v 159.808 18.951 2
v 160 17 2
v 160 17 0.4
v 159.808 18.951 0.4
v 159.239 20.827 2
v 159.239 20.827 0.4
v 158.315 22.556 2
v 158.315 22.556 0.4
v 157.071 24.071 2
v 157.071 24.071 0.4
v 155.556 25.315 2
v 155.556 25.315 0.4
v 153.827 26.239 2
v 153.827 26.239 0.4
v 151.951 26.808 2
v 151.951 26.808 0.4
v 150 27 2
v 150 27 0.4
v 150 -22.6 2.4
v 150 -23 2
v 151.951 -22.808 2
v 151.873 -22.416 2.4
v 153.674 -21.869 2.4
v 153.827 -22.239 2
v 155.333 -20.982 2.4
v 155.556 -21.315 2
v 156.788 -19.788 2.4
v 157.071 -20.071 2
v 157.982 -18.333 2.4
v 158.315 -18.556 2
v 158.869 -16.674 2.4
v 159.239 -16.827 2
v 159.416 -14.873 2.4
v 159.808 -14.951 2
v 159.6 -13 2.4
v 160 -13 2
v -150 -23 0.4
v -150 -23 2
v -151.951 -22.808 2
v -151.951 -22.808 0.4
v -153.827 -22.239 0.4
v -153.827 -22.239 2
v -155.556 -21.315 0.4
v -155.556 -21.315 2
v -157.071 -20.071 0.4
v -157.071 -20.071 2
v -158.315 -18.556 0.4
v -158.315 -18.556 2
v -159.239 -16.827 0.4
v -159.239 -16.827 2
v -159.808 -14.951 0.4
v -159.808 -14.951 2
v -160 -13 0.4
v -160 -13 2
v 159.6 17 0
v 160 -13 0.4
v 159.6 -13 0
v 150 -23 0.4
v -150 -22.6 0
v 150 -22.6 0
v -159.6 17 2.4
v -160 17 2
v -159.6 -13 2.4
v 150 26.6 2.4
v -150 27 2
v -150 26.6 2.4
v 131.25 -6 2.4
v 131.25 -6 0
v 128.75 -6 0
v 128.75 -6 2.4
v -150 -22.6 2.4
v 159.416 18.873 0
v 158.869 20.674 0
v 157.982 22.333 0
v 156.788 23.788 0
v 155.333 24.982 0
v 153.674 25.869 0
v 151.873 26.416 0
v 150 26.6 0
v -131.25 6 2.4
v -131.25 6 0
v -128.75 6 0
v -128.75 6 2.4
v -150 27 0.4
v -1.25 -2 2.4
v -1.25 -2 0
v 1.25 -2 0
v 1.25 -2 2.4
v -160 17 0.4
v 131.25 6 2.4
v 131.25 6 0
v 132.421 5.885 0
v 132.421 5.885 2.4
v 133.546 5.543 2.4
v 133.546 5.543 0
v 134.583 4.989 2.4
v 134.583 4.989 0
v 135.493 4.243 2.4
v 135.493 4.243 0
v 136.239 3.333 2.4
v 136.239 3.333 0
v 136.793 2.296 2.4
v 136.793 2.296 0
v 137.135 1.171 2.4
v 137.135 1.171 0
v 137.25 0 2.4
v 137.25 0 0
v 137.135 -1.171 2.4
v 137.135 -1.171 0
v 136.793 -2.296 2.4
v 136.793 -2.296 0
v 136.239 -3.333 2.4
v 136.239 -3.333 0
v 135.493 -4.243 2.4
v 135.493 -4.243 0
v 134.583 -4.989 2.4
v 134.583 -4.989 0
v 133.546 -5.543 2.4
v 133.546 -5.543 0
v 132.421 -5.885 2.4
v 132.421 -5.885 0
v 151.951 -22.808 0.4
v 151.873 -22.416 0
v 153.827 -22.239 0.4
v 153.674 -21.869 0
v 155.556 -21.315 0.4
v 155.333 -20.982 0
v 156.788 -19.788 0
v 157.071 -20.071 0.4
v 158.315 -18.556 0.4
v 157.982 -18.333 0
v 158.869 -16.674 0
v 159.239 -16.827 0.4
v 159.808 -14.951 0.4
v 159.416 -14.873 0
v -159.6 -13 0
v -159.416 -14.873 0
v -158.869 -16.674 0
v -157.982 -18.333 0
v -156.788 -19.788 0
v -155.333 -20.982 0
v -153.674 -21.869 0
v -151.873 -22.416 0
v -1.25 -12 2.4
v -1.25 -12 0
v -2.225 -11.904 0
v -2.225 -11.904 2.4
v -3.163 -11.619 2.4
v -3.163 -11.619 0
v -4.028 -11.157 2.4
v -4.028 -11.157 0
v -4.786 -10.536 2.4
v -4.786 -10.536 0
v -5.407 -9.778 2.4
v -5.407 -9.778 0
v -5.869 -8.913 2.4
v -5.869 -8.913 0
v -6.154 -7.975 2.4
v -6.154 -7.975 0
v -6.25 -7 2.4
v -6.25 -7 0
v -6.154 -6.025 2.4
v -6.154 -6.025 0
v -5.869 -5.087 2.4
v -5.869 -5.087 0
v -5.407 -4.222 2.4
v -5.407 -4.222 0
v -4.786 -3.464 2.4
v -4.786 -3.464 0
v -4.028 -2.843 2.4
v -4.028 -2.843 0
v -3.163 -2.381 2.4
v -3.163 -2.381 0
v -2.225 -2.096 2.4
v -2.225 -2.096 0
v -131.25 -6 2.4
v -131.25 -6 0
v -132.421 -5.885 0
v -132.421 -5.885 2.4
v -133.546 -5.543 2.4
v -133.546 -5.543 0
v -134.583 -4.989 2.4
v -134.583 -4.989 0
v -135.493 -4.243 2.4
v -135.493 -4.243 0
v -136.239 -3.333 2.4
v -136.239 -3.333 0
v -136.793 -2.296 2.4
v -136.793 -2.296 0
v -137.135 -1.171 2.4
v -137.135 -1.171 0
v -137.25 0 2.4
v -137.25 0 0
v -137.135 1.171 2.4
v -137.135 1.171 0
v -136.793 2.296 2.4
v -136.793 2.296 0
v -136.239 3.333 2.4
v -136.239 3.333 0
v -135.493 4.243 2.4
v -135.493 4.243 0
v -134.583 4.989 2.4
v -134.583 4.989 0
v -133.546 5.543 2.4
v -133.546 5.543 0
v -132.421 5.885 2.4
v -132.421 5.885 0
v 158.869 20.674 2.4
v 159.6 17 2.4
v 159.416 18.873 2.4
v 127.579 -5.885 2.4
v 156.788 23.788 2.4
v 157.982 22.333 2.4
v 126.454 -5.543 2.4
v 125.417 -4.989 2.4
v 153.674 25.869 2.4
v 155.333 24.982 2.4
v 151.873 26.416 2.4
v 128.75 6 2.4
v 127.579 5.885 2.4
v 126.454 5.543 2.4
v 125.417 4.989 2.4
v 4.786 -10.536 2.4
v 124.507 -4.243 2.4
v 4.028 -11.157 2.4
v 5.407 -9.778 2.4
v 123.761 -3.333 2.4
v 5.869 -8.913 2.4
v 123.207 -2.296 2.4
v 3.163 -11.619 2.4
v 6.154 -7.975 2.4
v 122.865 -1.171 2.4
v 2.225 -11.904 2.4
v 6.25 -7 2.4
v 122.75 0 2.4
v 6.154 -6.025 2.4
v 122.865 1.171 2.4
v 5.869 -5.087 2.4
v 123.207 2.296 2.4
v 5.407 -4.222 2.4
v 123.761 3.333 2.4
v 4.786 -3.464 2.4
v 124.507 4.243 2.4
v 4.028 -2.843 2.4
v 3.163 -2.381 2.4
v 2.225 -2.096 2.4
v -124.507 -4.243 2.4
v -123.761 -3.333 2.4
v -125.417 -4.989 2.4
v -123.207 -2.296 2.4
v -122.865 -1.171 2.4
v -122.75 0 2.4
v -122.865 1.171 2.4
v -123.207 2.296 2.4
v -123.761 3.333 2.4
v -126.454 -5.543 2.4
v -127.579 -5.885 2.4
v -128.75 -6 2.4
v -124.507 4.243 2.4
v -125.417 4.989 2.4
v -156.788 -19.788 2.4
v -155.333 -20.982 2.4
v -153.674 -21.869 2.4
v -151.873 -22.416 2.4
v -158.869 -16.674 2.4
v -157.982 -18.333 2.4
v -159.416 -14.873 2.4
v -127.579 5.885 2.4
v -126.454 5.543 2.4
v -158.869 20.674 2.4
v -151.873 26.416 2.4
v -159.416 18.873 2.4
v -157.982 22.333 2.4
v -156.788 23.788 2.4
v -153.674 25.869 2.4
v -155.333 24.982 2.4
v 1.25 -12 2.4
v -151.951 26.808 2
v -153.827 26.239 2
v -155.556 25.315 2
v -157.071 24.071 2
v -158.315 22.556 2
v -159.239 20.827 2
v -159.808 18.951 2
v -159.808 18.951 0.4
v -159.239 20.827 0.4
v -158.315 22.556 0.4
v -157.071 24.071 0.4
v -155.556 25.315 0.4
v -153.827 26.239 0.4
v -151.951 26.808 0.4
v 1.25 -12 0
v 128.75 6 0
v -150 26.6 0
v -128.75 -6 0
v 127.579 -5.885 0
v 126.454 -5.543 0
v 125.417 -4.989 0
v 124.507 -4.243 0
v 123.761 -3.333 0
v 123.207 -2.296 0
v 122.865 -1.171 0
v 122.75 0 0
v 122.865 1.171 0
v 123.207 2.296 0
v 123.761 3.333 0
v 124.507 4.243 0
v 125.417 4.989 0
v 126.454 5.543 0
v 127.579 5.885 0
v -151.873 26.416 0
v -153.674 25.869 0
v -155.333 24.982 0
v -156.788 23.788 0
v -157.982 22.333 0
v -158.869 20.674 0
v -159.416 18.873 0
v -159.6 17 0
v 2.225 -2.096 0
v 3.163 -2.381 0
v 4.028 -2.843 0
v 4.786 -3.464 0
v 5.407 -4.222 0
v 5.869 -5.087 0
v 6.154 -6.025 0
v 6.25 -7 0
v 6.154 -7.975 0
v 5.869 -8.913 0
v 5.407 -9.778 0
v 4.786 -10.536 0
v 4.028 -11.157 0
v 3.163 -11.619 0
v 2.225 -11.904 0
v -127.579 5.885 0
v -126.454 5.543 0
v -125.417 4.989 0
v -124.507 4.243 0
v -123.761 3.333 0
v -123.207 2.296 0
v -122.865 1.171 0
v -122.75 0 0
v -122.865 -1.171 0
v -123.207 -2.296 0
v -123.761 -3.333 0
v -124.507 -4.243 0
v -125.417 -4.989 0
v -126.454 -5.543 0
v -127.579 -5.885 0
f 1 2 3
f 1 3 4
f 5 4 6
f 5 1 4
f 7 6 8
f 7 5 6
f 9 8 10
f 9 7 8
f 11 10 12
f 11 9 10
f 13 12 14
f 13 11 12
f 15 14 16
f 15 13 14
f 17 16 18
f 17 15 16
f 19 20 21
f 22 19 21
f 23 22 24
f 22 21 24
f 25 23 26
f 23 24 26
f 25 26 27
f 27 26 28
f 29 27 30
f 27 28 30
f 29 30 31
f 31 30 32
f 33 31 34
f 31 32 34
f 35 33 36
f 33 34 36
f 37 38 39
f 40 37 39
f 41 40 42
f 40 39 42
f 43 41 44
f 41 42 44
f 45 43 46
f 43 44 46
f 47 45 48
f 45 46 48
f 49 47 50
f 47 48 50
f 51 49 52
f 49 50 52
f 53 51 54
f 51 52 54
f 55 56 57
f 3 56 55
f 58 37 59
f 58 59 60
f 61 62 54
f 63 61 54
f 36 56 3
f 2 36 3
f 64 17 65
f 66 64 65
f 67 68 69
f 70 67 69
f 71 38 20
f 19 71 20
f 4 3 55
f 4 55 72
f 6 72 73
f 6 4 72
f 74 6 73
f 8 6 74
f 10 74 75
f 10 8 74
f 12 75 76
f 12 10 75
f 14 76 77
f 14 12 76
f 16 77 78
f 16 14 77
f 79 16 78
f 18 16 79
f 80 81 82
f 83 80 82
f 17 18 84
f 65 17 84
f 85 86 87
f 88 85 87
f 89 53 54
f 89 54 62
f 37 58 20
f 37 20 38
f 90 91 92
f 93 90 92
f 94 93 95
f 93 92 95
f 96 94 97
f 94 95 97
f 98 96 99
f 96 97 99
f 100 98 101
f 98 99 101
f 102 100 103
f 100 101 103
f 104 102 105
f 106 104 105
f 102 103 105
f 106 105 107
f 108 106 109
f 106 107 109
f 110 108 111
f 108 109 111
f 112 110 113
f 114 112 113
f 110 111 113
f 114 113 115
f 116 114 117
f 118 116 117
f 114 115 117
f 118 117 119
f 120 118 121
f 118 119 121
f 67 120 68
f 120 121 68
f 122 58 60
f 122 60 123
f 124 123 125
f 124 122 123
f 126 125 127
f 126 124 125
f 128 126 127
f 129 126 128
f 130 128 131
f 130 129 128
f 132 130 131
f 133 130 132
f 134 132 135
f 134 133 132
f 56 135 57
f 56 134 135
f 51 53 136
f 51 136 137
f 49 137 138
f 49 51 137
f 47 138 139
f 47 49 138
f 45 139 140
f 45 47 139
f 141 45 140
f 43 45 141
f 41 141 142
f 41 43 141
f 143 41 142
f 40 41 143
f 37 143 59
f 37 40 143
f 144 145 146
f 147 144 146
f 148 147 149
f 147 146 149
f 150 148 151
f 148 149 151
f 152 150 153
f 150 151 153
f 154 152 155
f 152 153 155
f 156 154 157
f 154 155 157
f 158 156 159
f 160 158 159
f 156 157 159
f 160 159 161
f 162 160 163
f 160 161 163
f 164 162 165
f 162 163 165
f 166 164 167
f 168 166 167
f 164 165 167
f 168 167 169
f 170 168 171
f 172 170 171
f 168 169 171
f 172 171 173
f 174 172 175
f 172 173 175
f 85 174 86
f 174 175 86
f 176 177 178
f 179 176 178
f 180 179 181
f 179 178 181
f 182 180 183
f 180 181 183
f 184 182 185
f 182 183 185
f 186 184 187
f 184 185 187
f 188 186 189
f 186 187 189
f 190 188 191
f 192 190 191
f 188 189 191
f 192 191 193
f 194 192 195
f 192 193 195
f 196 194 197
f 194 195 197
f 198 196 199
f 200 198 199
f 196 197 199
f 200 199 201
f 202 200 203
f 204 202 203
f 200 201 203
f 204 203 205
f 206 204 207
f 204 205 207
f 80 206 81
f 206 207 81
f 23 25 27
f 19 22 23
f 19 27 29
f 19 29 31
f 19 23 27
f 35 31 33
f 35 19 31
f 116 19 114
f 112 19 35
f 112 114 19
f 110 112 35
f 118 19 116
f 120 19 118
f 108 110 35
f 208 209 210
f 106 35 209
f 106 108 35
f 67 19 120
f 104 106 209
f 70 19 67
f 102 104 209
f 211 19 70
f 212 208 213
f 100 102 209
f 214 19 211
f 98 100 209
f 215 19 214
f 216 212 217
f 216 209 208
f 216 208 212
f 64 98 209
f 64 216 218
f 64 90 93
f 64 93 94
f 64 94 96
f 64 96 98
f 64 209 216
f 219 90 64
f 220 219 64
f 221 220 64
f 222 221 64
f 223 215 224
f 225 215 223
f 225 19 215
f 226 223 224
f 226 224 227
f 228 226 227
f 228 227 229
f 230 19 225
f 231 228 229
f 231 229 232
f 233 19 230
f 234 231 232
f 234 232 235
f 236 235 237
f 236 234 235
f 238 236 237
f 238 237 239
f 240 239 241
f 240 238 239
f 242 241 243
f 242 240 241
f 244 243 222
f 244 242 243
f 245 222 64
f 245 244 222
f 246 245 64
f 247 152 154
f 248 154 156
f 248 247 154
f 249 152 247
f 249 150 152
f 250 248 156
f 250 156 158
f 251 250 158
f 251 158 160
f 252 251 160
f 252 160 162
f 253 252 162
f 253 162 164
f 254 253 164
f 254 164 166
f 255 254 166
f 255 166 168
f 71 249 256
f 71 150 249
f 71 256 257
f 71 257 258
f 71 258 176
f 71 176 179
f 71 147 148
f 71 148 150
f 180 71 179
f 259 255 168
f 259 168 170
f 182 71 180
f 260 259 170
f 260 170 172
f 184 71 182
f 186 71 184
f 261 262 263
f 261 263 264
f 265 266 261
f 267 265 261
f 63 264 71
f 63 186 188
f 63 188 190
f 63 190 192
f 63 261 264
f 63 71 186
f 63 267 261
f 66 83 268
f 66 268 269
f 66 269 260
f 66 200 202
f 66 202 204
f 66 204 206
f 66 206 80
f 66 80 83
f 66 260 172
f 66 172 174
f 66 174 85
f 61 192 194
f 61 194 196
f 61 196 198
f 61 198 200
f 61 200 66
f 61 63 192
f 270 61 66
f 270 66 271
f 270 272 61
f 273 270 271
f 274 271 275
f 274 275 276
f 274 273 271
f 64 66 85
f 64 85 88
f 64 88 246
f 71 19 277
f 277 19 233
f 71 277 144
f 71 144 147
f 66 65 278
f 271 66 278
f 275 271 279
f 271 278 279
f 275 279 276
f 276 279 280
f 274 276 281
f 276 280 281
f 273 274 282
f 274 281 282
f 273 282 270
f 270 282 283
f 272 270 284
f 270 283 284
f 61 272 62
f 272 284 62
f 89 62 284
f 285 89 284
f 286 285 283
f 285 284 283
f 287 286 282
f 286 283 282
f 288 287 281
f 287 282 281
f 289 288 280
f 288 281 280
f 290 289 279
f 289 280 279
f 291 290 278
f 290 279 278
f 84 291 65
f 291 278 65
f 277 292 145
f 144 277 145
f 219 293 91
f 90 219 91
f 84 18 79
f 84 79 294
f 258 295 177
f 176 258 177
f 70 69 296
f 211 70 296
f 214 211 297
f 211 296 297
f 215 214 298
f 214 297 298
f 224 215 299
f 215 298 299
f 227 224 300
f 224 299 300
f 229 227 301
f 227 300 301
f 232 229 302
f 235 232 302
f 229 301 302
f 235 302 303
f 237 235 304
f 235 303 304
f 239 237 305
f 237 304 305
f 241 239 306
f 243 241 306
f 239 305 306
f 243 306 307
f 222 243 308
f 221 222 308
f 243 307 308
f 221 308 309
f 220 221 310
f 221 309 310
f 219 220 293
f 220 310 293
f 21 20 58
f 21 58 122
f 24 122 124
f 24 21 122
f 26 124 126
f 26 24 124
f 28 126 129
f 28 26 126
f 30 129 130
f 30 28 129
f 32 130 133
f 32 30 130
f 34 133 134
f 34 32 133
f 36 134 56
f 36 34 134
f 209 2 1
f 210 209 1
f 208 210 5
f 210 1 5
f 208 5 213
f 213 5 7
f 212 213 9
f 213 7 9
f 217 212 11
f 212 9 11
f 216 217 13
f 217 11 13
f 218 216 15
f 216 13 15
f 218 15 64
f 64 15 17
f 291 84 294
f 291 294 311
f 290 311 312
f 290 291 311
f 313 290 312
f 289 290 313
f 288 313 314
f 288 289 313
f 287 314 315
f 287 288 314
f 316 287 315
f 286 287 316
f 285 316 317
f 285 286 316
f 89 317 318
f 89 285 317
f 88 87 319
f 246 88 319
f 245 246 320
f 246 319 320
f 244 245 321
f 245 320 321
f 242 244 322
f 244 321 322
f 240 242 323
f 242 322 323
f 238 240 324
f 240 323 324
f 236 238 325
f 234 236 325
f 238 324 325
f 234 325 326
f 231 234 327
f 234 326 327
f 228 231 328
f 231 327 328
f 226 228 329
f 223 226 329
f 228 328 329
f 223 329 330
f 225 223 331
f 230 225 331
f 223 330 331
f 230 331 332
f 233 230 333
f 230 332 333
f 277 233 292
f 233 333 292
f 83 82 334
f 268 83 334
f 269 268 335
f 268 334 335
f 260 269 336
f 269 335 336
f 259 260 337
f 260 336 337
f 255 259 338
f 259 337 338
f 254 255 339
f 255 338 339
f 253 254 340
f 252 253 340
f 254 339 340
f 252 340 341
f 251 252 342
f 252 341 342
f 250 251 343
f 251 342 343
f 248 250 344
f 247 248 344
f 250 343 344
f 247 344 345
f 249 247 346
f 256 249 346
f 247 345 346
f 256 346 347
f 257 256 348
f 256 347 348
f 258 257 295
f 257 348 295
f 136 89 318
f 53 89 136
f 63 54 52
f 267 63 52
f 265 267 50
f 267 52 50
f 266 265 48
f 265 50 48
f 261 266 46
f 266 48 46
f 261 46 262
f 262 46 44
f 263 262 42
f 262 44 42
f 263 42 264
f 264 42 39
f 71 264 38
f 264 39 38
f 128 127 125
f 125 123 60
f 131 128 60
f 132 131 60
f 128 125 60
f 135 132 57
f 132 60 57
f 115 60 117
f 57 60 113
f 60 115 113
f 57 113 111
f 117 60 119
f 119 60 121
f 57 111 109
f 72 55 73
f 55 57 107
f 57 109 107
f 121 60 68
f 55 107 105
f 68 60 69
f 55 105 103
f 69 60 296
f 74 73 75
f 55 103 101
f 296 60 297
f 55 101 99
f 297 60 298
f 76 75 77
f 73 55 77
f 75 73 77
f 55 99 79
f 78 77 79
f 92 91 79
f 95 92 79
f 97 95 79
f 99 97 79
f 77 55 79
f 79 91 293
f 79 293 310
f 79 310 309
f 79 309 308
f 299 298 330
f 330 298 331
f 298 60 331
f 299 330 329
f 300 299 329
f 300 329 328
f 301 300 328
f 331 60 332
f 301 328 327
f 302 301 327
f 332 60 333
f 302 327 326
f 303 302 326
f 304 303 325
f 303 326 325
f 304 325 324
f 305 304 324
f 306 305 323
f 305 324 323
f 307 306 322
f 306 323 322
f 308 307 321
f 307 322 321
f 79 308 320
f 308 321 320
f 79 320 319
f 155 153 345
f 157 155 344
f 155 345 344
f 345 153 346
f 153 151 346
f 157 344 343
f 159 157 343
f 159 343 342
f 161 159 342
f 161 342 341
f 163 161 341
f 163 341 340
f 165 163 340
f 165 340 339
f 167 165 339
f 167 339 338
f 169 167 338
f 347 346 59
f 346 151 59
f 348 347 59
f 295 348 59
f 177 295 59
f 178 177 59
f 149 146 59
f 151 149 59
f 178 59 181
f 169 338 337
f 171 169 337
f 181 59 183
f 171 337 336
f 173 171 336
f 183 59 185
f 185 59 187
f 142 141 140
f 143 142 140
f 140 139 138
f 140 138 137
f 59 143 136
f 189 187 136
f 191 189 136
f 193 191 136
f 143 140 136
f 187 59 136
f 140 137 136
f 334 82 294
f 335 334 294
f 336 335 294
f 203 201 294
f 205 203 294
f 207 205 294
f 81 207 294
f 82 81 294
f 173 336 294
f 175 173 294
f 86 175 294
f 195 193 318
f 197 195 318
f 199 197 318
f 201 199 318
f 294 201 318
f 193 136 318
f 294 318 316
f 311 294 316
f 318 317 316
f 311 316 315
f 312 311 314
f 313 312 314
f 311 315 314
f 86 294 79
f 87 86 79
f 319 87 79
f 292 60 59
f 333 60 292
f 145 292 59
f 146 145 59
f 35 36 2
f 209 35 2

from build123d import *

# Parameters (mm, degrees)
SKETCH1_W           = 50
SKETCH1_H           = 320
BOSS_EXTRUDE1_DEPTH = 2.4
FILLET1_R           = 10
CHAMFER1_SIZE       = 0.4


with BuildPart() as part:
    # Sketch1 → Boss-Extrude1 (new body)
    with BuildSketch(Plane(origin=(0, 0, 0), x_dir=(0, 1, 0), z_dir=(0, 0, 1))):
        with Locations((2, 0)):
            Rectangle(SKETCH1_W, SKETCH1_H)
        with BuildLine():
            Line((-6, 128.75), (-6, 131.25))
            ThreePointArc((-6, 131.25), (0, 137.25), (6, 131.25))
            Line((6, 131.25), (6, 128.75))
            ThreePointArc((6, 128.75), (0, 122.75), (-6, 128.75))
        make_face(mode=Mode.SUBTRACT)
        with BuildLine():
            Line((-6, -131.25), (-6, -128.75))
            ThreePointArc((-6, -128.75), (0, -122.75), (6, -128.75))
            Line((6, -128.75), (6, -131.25))
            ThreePointArc((6, -131.25), (0, -137.25), (-6, -131.25))
        make_face(mode=Mode.SUBTRACT)
        with BuildLine():
            Line((-2, 1.25), (-2, -1.25))
            ThreePointArc((-2, -1.25), (-7, -6.25), (-12, -1.25))
            Line((-12, -1.25), (-12, 1.25))
            ThreePointArc((-12, 1.25), (-7, 6.25), (-2, 1.25))
        make_face(mode=Mode.SUBTRACT)
    extrude(amount=BOSS_EXTRUDE1_DEPTH)

    # Fillet1
    fillet1_edges = [part.edges().sort_by_distance(p)[0] for p in [
        (160, 27, 1.2),
        (160, -23, 1.2),
        (-160, -23, 1.2),
        (-160, 27, 1.2),
    ]]
    fillet(fillet1_edges, radius=FILLET1_R)

    # Chamfer1
    chamfer1_edges = [part.edges().sort_by_distance(p)[0] for p in [
        (0, 27, 0),
        (0, 27, 2.4),
        (160, 2, 0),
        (0, -23, 0),
        (-160, 2, 0),
        (157.071067812, -20.071067812, 0),
        (-157.071067812, -20.071067812, 0),
        (-157.071067812, 24.071067812, 0),
        (157.071067812, 24.071067812, 0),
        (160, 2, 2.4),
        (-160, 2, 2.4),
        (0, -23, 2.4),
        (157.071067812, -20.071067812, 2.4),
        (-157.071067812, -20.071067812, 2.4),
        (-157.071067812, 24.071067812, 2.4),
        (157.071067812, 24.071067812, 2.4),
    ]]
    chamfer(chamfer1_edges, length=CHAMFER1_SIZE)


solid = part.part
